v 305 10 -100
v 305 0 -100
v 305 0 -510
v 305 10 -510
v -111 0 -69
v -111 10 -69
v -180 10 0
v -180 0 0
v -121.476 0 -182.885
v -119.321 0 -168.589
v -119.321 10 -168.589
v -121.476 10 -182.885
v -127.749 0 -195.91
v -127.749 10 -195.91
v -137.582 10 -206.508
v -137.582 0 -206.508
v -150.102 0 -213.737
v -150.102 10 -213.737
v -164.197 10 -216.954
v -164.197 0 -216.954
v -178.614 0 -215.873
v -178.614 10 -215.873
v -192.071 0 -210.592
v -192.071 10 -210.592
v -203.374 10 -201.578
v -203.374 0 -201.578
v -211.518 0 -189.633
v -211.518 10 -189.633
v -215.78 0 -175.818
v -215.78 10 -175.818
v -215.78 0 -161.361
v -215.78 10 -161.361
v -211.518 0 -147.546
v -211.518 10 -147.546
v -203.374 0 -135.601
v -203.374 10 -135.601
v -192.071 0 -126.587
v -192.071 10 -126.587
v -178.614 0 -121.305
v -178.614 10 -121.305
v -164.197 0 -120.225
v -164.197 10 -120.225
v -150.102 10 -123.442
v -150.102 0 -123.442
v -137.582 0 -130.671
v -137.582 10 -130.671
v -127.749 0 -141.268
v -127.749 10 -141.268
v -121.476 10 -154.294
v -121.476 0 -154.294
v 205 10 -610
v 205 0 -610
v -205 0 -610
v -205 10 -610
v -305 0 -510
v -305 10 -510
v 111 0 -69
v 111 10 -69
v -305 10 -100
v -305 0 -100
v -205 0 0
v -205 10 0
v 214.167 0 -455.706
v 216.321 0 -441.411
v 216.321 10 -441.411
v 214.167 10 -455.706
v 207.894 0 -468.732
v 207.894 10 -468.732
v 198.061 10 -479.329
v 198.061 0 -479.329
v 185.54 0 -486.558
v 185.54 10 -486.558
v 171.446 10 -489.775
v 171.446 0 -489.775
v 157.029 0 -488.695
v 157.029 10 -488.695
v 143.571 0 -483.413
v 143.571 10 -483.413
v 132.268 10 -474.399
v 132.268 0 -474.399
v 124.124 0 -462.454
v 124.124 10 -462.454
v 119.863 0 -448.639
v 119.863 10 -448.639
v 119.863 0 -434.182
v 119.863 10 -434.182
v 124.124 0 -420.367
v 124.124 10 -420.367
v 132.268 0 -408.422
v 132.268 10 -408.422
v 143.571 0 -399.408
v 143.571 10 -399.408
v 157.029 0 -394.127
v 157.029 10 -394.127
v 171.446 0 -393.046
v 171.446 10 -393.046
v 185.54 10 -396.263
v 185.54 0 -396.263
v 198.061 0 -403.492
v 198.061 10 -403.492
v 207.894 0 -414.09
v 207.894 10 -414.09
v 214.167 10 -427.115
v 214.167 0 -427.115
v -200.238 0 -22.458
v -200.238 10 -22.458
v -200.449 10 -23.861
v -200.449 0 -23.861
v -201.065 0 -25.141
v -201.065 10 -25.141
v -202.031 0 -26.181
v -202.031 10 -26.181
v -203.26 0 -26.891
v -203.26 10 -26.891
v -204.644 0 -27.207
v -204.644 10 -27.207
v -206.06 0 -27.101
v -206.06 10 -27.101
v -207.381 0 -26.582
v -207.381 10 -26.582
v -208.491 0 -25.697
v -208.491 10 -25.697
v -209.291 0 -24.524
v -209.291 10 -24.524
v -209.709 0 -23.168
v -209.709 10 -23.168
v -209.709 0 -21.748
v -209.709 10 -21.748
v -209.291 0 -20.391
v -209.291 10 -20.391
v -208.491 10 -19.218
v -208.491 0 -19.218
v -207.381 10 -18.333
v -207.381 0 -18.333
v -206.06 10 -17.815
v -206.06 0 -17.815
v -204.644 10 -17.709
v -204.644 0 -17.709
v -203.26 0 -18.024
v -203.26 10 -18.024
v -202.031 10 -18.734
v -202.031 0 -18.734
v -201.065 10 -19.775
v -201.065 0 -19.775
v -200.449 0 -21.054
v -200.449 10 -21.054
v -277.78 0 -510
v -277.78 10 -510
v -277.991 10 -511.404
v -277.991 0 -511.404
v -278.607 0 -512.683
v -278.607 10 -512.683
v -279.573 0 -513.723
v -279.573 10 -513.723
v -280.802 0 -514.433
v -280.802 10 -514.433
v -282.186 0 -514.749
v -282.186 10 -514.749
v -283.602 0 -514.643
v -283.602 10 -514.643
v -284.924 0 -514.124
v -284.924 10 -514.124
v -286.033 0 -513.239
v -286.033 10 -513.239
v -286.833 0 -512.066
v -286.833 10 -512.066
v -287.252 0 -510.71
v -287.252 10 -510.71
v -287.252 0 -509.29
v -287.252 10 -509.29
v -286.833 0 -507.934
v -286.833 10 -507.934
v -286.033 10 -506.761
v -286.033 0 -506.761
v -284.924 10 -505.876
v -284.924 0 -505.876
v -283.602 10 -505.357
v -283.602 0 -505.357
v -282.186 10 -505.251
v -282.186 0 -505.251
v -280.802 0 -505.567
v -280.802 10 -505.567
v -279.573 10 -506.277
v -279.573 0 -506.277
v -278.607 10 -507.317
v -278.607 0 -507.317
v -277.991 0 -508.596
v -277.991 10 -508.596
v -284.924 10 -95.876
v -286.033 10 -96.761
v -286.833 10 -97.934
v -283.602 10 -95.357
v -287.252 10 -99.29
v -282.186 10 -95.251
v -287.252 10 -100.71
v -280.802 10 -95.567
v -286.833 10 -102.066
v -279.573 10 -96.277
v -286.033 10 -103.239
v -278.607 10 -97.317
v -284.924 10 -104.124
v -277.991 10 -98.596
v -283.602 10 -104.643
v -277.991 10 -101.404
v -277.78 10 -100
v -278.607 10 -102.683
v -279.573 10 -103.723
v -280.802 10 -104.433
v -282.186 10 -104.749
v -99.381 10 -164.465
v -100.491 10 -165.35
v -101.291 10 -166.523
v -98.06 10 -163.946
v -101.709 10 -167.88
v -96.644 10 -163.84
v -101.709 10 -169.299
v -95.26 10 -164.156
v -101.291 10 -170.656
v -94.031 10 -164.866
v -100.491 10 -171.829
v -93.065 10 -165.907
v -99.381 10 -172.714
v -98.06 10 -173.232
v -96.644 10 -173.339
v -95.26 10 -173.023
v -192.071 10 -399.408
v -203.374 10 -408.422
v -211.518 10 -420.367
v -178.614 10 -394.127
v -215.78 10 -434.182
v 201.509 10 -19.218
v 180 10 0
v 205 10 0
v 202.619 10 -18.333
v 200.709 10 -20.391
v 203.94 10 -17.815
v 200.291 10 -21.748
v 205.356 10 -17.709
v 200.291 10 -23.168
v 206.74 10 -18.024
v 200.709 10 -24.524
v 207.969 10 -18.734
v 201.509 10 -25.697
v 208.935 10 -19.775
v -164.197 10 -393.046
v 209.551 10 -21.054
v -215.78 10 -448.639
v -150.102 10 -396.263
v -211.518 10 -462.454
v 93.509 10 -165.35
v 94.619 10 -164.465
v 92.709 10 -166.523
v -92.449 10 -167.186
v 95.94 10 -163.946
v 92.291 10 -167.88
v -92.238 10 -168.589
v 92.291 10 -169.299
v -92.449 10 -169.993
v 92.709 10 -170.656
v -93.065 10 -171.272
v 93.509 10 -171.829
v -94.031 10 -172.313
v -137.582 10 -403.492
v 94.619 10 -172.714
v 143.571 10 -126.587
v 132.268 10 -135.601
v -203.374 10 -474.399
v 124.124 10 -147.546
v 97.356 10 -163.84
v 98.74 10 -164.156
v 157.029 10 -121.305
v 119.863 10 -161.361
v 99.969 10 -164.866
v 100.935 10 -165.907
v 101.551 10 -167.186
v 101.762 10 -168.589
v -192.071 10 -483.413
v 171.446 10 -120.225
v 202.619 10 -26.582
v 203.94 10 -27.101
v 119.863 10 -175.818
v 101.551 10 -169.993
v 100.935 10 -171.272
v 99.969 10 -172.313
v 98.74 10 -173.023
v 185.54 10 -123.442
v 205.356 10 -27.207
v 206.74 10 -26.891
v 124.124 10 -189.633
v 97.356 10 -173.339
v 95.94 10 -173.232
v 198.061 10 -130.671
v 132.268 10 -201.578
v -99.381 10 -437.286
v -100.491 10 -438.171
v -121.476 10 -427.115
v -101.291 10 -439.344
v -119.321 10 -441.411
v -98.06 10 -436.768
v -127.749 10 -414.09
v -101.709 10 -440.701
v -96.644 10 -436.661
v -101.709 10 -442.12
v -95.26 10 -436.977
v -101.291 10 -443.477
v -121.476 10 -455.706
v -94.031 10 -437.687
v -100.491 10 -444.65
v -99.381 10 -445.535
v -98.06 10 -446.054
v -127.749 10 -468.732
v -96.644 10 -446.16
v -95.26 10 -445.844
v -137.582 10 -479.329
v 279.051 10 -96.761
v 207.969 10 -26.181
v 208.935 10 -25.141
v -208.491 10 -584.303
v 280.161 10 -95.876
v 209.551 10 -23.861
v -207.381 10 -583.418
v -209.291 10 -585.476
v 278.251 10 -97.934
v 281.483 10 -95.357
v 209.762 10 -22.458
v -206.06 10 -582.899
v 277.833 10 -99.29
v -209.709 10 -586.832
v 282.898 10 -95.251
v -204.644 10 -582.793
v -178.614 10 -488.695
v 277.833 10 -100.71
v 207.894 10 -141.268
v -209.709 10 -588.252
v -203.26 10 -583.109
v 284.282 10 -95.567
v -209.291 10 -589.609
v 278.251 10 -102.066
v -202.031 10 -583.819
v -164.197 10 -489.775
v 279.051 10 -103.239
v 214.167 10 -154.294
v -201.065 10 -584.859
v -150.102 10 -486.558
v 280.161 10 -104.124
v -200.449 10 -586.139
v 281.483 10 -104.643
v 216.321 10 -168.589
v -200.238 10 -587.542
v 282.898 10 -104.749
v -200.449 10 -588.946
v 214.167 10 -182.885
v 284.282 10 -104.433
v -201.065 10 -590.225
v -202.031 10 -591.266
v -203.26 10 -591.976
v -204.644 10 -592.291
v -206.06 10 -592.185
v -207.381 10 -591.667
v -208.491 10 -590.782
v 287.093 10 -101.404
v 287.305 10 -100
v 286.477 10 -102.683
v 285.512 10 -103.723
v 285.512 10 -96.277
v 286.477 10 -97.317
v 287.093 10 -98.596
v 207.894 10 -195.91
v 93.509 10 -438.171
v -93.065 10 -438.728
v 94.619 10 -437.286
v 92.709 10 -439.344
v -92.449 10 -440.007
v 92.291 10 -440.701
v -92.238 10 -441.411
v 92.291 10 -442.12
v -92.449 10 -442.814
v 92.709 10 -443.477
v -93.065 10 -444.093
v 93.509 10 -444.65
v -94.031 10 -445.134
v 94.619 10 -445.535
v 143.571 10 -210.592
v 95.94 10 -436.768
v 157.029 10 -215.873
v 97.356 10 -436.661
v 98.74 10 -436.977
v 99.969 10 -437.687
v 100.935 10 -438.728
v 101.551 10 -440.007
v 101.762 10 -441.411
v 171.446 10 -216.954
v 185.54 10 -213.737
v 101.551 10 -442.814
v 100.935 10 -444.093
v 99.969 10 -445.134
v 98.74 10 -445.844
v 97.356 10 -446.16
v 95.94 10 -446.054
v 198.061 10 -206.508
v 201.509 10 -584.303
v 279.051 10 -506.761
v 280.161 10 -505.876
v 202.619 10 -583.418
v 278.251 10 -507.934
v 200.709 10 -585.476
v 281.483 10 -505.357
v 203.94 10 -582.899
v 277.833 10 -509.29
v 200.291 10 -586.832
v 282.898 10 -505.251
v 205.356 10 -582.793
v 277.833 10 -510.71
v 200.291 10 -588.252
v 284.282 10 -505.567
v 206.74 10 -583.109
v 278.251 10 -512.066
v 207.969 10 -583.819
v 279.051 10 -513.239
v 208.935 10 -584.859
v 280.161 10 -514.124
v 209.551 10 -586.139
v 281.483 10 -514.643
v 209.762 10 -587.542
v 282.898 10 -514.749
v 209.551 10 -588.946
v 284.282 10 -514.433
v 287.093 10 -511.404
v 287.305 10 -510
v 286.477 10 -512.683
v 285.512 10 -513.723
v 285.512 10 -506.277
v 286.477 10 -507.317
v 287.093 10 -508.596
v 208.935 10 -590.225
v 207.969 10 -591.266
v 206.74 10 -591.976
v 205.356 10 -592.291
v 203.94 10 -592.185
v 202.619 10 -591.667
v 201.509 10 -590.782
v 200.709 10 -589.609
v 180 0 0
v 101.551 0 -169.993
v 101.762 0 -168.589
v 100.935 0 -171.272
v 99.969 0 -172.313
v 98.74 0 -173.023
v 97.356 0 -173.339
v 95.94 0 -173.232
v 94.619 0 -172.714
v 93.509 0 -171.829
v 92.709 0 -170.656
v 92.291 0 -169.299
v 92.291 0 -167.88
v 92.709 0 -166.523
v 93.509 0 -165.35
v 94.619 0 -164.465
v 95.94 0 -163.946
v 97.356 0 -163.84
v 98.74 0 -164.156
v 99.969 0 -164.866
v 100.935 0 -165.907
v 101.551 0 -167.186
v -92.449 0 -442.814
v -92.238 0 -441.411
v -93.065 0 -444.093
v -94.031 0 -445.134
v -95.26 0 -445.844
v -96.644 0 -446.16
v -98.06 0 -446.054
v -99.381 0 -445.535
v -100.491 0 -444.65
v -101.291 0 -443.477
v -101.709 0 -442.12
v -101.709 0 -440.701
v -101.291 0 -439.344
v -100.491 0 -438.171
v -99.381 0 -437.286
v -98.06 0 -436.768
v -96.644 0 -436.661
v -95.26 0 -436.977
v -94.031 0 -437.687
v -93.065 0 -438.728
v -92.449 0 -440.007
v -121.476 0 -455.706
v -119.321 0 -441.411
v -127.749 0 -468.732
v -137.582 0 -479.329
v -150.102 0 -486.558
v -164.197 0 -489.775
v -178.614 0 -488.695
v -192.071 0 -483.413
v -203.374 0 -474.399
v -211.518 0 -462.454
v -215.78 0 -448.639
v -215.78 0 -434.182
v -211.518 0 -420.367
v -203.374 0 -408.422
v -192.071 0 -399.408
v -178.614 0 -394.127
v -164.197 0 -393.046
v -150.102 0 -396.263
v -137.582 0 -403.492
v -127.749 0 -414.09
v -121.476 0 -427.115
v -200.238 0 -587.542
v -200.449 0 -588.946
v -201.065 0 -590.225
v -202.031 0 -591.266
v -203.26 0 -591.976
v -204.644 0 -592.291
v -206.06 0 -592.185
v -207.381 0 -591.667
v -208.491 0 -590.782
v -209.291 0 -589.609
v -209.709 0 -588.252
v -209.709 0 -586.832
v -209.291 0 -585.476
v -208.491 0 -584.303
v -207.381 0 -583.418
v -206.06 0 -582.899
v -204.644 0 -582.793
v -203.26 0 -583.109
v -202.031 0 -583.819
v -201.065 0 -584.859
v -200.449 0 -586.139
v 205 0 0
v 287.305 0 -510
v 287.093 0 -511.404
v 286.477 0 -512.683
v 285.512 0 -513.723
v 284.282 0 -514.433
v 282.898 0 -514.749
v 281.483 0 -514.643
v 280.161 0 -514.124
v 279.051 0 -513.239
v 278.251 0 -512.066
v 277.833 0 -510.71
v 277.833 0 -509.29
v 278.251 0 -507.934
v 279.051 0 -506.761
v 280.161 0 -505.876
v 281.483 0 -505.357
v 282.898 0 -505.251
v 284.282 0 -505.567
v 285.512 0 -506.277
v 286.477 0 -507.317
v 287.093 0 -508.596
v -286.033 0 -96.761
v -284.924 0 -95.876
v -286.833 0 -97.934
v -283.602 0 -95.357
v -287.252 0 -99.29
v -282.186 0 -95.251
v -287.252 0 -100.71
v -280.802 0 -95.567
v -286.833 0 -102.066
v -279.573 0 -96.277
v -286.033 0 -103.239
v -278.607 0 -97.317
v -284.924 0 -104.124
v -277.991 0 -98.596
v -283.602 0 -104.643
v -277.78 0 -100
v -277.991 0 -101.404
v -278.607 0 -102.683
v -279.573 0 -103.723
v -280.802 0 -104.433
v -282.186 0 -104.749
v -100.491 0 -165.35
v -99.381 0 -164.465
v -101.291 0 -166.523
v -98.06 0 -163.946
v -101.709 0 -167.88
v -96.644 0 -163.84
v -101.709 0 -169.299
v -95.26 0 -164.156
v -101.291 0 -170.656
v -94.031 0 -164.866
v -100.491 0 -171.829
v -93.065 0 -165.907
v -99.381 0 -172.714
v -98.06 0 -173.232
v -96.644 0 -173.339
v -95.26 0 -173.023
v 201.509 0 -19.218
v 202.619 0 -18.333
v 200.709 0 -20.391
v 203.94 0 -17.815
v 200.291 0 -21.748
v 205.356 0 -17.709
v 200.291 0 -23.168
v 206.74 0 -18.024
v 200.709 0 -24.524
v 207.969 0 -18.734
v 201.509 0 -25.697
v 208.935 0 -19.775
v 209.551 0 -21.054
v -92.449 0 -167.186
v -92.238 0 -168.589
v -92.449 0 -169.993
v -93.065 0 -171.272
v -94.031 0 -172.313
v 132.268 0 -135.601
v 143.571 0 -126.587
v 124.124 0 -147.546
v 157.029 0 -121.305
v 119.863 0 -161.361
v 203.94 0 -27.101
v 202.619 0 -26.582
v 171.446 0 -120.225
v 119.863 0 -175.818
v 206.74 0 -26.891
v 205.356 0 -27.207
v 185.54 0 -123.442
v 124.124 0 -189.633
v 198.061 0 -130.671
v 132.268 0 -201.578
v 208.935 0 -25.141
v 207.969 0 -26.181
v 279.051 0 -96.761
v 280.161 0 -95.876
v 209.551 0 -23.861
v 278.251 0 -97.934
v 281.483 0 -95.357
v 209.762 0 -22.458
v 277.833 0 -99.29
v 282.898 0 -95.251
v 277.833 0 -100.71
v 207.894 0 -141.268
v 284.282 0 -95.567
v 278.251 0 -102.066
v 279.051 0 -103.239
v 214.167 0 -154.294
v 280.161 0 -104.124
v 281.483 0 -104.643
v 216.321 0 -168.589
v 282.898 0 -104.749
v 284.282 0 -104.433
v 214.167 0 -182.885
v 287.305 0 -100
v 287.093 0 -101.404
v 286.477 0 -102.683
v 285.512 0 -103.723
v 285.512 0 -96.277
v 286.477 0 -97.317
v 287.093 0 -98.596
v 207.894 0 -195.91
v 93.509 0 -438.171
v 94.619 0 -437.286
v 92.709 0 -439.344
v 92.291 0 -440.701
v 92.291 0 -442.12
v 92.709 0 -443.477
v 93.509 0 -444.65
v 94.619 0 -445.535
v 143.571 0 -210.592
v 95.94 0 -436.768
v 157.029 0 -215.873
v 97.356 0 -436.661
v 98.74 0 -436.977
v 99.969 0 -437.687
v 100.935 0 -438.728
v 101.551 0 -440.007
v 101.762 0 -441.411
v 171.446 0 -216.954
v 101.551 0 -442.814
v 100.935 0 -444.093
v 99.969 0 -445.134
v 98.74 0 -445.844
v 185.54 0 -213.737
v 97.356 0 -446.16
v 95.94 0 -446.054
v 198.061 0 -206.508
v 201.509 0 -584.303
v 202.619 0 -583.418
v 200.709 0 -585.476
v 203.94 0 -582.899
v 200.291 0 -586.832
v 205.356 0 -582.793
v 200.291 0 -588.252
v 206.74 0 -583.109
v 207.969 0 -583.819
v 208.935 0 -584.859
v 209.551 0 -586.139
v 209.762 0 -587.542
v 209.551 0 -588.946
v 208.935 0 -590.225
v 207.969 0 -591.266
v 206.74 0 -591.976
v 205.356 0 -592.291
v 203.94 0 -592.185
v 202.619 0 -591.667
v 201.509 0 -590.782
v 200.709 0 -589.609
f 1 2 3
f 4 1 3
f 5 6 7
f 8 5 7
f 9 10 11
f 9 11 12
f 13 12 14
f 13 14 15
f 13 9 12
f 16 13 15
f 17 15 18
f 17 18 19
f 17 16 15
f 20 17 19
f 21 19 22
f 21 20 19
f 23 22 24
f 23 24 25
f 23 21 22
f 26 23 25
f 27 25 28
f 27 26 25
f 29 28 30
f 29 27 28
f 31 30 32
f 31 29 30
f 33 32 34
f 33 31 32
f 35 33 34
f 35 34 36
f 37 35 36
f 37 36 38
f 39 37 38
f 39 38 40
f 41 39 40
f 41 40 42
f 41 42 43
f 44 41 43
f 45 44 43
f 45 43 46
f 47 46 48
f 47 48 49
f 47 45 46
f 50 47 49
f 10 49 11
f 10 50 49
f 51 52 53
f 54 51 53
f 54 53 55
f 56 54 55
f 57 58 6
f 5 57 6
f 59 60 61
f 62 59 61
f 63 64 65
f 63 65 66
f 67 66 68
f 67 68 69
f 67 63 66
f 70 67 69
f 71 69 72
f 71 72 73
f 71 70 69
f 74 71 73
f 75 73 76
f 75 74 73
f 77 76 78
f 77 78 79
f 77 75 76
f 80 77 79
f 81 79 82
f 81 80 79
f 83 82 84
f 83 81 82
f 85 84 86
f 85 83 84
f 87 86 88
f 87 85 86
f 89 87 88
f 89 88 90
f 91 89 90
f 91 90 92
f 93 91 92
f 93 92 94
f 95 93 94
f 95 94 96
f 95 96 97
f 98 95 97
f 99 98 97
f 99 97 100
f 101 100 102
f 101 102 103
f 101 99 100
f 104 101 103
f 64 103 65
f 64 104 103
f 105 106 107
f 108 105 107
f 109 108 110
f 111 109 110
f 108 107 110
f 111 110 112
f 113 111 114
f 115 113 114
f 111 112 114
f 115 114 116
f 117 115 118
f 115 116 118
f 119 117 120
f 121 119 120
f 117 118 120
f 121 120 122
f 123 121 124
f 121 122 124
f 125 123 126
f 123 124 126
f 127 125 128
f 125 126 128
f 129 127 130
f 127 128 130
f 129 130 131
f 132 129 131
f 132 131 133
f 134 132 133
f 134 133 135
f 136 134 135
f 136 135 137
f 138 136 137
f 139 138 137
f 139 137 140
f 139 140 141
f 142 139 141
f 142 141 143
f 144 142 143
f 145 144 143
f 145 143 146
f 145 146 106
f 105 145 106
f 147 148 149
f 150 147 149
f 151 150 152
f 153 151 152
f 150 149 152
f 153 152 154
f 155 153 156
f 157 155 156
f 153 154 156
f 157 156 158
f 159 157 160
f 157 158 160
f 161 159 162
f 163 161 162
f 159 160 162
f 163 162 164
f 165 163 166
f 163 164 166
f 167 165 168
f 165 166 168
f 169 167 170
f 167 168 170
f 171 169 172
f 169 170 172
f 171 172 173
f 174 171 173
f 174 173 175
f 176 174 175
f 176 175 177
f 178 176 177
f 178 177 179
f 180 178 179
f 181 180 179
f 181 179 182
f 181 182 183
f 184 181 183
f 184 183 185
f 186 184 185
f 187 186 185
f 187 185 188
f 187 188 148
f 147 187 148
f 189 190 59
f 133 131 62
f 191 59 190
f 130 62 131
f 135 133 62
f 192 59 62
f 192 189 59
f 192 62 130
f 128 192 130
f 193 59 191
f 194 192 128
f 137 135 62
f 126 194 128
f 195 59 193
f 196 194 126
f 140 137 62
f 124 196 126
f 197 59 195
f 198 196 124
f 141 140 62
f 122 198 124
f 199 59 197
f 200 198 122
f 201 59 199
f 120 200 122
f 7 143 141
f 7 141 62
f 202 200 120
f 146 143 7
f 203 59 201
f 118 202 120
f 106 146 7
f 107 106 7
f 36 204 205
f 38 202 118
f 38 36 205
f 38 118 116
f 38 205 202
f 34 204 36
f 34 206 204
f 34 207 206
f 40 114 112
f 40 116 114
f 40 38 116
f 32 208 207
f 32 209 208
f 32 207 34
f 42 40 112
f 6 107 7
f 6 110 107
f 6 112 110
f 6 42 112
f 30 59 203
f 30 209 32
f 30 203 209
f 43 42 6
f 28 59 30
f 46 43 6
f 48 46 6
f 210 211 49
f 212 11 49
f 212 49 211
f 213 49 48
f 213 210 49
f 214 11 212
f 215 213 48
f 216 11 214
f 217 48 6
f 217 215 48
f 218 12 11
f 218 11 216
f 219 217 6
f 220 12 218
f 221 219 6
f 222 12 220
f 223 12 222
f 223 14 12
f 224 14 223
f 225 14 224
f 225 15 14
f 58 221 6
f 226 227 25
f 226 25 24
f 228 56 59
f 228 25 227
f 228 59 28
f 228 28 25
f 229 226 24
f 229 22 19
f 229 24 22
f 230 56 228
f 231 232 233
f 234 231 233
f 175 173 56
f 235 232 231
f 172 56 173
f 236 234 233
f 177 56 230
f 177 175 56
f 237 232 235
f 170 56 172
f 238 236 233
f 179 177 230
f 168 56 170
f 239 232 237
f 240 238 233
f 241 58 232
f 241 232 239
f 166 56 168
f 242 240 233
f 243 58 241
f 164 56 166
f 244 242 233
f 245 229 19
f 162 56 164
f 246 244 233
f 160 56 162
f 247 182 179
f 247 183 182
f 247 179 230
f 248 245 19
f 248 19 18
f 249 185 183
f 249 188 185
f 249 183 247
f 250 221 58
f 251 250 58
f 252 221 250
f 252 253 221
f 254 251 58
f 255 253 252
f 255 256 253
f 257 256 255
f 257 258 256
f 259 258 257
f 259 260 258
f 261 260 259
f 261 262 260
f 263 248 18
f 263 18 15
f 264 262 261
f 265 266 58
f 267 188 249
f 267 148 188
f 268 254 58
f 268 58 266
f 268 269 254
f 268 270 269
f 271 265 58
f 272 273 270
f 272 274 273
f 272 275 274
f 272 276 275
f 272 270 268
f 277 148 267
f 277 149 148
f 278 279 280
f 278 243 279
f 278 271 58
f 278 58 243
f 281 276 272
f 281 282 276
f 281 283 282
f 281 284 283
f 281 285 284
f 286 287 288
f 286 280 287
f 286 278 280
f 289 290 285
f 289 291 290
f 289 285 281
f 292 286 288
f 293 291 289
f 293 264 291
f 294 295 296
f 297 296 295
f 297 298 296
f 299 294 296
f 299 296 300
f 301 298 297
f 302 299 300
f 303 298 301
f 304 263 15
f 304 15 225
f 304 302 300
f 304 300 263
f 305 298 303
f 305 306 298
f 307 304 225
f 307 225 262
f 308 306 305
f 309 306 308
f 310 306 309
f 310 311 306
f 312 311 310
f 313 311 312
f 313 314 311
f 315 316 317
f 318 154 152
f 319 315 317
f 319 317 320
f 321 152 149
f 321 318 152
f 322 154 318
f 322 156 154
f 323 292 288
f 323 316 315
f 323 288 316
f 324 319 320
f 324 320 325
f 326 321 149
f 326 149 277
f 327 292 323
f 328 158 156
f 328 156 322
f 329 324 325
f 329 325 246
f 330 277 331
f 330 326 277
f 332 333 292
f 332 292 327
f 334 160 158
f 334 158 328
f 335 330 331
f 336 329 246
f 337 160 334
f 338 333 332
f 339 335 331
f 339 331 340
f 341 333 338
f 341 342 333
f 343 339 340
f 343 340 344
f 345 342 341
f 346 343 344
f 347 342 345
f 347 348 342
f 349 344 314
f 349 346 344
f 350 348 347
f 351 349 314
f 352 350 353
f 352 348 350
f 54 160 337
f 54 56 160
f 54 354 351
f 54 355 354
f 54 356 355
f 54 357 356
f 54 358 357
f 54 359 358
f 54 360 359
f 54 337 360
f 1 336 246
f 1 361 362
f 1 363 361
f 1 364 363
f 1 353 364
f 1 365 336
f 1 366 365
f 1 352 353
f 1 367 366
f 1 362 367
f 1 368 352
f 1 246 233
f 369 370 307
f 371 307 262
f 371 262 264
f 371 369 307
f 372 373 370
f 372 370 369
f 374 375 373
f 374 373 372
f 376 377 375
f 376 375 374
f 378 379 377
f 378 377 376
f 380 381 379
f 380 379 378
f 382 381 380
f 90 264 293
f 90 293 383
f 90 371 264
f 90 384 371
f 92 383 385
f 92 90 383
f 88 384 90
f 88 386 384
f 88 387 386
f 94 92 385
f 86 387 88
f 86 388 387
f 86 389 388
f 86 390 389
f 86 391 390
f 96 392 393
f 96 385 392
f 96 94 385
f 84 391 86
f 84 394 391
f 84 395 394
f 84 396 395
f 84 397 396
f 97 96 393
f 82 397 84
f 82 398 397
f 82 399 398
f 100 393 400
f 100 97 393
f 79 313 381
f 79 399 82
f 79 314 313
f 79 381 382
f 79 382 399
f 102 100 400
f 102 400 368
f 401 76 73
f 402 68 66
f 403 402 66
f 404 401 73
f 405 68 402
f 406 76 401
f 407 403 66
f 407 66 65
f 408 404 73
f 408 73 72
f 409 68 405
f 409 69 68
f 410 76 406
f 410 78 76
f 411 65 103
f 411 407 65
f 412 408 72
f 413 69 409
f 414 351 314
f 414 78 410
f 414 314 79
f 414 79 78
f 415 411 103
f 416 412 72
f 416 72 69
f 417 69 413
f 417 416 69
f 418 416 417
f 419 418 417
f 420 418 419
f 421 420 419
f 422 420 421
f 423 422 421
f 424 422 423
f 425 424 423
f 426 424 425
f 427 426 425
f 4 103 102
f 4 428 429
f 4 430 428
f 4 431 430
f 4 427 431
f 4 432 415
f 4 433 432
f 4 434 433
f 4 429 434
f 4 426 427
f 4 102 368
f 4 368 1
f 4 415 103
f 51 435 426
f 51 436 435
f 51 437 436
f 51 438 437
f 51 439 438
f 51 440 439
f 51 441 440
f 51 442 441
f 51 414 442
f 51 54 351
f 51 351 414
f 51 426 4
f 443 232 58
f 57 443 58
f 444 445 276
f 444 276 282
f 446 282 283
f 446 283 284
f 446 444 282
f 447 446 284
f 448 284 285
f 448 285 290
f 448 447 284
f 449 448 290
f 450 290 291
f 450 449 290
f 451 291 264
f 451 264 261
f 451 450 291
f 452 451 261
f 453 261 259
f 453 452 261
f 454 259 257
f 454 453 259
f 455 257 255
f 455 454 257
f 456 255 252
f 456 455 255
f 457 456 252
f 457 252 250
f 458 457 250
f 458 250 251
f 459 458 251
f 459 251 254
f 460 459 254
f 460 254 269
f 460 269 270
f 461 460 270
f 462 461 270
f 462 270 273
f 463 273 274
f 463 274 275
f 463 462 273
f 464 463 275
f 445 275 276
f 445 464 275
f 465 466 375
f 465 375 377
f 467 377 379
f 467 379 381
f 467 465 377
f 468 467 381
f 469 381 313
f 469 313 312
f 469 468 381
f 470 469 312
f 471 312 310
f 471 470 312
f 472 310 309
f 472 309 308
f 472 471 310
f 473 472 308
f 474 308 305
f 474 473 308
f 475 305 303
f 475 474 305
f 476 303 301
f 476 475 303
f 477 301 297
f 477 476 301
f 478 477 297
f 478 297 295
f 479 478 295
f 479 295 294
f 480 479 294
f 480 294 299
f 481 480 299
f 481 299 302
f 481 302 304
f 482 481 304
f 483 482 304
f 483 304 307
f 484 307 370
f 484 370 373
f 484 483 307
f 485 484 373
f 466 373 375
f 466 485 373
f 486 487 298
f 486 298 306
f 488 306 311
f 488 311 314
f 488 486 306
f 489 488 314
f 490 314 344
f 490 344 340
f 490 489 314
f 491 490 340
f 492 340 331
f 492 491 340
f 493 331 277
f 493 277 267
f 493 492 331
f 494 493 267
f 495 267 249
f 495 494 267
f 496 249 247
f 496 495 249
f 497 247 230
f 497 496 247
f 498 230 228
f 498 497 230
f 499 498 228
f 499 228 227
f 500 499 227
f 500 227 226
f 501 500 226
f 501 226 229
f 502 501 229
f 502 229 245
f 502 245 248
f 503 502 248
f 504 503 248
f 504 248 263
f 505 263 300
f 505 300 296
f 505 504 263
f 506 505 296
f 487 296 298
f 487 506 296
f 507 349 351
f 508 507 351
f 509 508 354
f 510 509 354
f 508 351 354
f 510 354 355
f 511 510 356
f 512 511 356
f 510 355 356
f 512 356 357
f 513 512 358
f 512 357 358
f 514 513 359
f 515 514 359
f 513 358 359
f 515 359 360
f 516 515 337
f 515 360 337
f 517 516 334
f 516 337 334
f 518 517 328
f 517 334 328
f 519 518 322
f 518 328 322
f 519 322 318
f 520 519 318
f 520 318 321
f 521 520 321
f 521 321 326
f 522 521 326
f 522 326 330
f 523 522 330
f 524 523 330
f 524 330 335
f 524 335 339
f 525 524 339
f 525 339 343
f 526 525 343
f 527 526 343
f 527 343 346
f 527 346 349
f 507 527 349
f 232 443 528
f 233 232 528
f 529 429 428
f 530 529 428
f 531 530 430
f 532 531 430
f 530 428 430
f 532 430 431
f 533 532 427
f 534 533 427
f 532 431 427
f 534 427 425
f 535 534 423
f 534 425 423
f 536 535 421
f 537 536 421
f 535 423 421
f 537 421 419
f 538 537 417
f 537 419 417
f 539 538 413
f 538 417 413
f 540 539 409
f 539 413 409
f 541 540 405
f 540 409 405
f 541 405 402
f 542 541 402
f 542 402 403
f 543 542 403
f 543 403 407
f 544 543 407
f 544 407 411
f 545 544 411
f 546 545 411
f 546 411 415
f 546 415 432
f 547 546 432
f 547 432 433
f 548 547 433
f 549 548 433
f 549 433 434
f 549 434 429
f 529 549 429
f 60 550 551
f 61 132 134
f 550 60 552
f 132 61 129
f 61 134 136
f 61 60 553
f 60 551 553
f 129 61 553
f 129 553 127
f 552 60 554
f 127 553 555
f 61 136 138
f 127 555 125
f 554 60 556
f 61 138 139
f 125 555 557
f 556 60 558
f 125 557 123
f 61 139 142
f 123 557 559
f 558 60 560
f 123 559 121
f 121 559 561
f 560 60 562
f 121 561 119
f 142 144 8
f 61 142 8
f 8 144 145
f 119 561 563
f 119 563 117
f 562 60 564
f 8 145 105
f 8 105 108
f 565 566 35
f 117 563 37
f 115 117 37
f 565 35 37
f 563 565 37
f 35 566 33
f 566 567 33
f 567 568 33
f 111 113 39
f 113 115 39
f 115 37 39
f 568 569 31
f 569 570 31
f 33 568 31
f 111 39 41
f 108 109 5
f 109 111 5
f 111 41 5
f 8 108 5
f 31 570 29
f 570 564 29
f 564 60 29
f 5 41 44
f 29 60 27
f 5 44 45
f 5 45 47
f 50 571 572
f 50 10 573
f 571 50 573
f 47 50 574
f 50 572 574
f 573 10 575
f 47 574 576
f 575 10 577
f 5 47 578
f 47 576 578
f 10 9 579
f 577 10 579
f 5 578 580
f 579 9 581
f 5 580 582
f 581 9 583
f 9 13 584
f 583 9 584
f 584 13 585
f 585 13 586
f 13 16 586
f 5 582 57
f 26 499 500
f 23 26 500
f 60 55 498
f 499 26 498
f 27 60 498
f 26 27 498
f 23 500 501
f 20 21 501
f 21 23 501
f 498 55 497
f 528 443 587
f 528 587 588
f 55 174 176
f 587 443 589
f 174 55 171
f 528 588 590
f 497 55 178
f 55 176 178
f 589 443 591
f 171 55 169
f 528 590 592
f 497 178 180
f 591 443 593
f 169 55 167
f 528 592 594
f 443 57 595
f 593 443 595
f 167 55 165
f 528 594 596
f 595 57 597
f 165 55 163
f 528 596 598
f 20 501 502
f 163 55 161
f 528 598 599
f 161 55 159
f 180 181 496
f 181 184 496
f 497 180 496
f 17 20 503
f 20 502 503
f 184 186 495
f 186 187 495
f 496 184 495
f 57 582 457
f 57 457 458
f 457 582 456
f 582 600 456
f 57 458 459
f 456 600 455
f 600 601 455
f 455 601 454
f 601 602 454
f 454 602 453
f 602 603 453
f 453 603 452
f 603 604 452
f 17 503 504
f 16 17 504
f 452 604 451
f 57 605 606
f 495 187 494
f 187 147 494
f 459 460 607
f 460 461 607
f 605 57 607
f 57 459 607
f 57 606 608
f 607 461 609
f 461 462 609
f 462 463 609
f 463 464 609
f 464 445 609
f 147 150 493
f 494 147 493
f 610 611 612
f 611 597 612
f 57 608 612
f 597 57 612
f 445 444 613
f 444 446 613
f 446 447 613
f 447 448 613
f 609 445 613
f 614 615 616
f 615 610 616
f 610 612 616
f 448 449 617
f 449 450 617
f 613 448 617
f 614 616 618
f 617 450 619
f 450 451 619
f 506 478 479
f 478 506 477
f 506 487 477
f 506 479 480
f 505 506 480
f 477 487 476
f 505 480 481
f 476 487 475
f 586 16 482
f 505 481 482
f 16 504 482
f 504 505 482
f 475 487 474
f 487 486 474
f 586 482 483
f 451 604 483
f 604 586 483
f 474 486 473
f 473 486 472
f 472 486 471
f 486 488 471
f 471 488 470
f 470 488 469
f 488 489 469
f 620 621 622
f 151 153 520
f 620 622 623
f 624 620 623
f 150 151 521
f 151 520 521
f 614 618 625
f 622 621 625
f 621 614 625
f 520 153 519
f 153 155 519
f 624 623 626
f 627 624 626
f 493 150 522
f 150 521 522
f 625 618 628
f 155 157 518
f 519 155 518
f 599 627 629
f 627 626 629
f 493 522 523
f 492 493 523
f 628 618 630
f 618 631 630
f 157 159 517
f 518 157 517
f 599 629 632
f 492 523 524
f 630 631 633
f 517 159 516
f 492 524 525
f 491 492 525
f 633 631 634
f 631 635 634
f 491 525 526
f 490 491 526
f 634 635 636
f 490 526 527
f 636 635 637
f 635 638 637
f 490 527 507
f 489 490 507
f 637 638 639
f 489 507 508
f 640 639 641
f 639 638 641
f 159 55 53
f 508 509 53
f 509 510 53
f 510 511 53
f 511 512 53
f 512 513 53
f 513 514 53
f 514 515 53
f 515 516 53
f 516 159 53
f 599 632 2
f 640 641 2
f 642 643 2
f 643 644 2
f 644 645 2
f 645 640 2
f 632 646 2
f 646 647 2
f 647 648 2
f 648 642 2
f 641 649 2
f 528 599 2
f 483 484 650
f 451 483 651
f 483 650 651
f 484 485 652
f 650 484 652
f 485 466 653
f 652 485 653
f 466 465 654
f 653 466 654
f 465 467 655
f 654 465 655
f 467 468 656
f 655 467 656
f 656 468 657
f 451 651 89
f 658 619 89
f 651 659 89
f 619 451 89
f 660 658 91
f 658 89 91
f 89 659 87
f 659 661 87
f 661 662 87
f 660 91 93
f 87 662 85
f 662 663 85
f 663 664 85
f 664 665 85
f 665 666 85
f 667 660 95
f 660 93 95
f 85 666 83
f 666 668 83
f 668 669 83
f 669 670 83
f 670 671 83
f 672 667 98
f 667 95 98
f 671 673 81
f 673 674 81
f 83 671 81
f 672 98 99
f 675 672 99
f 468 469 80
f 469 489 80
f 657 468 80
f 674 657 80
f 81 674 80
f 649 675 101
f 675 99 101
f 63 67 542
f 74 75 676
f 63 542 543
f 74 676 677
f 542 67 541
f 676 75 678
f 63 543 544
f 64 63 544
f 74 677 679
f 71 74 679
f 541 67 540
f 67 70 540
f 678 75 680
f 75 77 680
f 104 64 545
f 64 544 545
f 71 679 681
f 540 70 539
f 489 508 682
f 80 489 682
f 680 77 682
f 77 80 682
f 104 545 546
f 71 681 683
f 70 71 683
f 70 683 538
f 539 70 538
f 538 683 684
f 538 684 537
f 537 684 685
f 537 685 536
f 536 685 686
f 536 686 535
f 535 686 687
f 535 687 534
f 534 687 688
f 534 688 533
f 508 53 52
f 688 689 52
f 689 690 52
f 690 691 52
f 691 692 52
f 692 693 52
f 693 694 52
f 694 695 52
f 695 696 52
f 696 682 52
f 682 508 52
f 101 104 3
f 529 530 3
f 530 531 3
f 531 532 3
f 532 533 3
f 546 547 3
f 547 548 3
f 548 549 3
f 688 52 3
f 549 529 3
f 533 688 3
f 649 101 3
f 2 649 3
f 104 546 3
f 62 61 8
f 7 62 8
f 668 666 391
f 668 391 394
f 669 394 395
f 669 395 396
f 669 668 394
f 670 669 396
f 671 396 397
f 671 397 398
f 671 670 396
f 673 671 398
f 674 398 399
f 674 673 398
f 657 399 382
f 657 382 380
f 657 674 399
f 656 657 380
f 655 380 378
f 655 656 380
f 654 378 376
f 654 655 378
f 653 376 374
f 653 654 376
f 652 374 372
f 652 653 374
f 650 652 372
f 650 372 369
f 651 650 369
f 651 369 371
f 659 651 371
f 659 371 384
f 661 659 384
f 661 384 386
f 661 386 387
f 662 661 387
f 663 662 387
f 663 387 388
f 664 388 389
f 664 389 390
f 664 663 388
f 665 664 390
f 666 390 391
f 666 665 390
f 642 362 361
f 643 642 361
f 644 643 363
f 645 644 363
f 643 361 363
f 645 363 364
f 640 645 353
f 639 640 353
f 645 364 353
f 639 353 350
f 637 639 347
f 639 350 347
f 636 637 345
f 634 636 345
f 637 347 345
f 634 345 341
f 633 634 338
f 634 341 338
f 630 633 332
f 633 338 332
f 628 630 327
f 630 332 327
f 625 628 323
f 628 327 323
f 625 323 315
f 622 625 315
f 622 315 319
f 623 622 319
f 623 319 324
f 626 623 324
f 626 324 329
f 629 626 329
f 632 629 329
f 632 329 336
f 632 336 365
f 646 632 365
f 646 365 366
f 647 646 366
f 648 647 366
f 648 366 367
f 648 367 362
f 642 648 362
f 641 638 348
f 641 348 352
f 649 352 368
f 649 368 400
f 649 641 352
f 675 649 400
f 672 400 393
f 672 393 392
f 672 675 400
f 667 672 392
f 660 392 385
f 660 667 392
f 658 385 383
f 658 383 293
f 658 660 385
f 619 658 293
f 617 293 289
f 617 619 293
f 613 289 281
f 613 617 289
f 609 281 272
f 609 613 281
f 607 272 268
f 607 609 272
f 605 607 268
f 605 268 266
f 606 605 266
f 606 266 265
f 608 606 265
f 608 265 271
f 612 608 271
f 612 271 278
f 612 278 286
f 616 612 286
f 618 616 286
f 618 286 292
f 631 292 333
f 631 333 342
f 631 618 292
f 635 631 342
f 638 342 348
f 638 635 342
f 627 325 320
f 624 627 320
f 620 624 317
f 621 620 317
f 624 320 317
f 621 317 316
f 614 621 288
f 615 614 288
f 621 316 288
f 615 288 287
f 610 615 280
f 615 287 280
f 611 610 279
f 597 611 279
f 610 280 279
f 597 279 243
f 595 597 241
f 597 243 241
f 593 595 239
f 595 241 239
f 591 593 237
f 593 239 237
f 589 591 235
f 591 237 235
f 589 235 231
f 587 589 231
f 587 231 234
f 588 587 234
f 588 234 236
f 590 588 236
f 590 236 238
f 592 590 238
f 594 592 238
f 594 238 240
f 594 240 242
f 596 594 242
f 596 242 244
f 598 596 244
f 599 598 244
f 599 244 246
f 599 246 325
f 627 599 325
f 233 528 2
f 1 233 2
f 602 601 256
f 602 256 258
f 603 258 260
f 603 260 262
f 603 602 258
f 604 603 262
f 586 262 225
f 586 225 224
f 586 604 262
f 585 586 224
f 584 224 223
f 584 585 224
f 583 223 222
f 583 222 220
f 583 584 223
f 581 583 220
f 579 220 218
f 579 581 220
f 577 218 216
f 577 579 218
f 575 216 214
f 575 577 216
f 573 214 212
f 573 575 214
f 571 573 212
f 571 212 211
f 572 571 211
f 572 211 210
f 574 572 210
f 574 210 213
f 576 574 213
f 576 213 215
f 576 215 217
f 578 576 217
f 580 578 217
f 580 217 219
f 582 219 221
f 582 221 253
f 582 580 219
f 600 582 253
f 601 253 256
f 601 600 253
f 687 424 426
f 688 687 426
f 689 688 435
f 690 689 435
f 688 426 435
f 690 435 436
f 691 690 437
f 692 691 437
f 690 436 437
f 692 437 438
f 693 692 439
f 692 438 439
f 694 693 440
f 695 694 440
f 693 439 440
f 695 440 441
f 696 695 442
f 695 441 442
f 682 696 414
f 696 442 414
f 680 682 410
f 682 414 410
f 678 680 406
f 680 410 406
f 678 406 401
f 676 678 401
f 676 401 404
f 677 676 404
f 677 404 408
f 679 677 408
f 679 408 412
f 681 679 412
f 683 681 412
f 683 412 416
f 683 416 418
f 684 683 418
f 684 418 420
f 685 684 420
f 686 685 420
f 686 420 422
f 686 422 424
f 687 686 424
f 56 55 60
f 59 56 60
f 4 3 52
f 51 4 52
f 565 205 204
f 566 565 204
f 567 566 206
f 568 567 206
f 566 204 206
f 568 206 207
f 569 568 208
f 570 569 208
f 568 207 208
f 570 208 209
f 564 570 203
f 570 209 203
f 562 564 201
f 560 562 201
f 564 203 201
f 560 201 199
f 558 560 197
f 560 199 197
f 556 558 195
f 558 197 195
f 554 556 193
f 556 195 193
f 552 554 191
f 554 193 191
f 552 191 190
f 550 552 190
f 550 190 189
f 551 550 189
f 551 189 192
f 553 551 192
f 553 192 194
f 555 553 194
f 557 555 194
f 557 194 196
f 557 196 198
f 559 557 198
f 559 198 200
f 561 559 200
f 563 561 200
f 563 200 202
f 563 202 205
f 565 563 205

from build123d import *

# Parameters (mm, degrees)
SKETCH1_R           = 48.5
SKETCH1_R_2         = 4.7625
BOSS_EXTRUDE1_DEPTH = 10
CUT_EXTRUDE1_DEPTH  = 5000
SKETCH3_R           = 4.7625
CUT_EXTRUDE2_DEPTH  = 5000


with BuildPart() as part:
    # Sketch1 → Boss-Extrude1 (new body)
    with BuildSketch(Plane(origin=(0, 0, 0), x_dir=(1, 0, 0), z_dir=(0, 1, 0))):
        Polygon((205, 610), (-205, 610), (-305, 510), (-305, 100), (-205, 0), (205, 0), (305, 100), (305, 510), align=None)
        with Locations((-167.82128445, 168.589357775)):
            Circle(SKETCH1_R, mode=Mode.SUBTRACT)
        with Locations((-97, 168.589357775)):
            Circle(SKETCH1_R_2, mode=Mode.SUBTRACT)
        with Locations((97, 168.589357775)):
            Circle(SKETCH1_R_2, mode=Mode.SUBTRACT)
        with Locations((167.82128445, 168.589357775)):
            Circle(SKETCH1_R, mode=Mode.SUBTRACT)
        with Locations((-167.82128445, 441.410642225)):
            Circle(SKETCH1_R, mode=Mode.SUBTRACT)
        with Locations((-97, 441.410642225)):
            Circle(SKETCH1_R_2, mode=Mode.SUBTRACT)
        with Locations((97, 441.410642225)):
            Circle(SKETCH1_R_2, mode=Mode.SUBTRACT)
        with Locations((167.82128445, 441.410642225)):
            Circle(SKETCH1_R, mode=Mode.SUBTRACT)
    extrude(amount=BOSS_EXTRUDE1_DEPTH)

    # Sketch2 → Cut-Extrude1 (cut)
    with BuildSketch(Plane(origin=(0, 10, 0), x_dir=(1, 0, 0), z_dir=(0, 1, 0))):
        Polygon((-111, 69), (-180, 0), (180, 0), (111, 69), align=None)
    extrude(amount=-CUT_EXTRUDE1_DEPTH, mode=Mode.SUBTRACT)

    # Sketch3 → Cut-Extrude2 (cut)
    with BuildSketch(Plane(origin=(0, 10, 0), x_dir=(1, 0, 0), z_dir=(0, 1, 0))):
        with Locations((-205, 22.45771137)):
            Circle(SKETCH3_R)
        with Locations((205, 22.45771137)):
            Circle(SKETCH3_R)
        with Locations((-282.54228863, 100)):
            Circle(SKETCH3_R)
        with Locations((282.54228863, 100)):
            Circle(SKETCH3_R)
        with Locations((282.54228863, 510)):
            Circle(SKETCH3_R)
        with Locations((205, 587.54228863)):
            Circle(SKETCH3_R)
        with Locations((-205, 587.54228863)):
            Circle(SKETCH3_R)
        with Locations((-282.54228863, 510)):
            Circle(SKETCH3_R)
    extrude(amount=-CUT_EXTRUDE2_DEPTH, mode=Mode.SUBTRACT)


solid = part.part
